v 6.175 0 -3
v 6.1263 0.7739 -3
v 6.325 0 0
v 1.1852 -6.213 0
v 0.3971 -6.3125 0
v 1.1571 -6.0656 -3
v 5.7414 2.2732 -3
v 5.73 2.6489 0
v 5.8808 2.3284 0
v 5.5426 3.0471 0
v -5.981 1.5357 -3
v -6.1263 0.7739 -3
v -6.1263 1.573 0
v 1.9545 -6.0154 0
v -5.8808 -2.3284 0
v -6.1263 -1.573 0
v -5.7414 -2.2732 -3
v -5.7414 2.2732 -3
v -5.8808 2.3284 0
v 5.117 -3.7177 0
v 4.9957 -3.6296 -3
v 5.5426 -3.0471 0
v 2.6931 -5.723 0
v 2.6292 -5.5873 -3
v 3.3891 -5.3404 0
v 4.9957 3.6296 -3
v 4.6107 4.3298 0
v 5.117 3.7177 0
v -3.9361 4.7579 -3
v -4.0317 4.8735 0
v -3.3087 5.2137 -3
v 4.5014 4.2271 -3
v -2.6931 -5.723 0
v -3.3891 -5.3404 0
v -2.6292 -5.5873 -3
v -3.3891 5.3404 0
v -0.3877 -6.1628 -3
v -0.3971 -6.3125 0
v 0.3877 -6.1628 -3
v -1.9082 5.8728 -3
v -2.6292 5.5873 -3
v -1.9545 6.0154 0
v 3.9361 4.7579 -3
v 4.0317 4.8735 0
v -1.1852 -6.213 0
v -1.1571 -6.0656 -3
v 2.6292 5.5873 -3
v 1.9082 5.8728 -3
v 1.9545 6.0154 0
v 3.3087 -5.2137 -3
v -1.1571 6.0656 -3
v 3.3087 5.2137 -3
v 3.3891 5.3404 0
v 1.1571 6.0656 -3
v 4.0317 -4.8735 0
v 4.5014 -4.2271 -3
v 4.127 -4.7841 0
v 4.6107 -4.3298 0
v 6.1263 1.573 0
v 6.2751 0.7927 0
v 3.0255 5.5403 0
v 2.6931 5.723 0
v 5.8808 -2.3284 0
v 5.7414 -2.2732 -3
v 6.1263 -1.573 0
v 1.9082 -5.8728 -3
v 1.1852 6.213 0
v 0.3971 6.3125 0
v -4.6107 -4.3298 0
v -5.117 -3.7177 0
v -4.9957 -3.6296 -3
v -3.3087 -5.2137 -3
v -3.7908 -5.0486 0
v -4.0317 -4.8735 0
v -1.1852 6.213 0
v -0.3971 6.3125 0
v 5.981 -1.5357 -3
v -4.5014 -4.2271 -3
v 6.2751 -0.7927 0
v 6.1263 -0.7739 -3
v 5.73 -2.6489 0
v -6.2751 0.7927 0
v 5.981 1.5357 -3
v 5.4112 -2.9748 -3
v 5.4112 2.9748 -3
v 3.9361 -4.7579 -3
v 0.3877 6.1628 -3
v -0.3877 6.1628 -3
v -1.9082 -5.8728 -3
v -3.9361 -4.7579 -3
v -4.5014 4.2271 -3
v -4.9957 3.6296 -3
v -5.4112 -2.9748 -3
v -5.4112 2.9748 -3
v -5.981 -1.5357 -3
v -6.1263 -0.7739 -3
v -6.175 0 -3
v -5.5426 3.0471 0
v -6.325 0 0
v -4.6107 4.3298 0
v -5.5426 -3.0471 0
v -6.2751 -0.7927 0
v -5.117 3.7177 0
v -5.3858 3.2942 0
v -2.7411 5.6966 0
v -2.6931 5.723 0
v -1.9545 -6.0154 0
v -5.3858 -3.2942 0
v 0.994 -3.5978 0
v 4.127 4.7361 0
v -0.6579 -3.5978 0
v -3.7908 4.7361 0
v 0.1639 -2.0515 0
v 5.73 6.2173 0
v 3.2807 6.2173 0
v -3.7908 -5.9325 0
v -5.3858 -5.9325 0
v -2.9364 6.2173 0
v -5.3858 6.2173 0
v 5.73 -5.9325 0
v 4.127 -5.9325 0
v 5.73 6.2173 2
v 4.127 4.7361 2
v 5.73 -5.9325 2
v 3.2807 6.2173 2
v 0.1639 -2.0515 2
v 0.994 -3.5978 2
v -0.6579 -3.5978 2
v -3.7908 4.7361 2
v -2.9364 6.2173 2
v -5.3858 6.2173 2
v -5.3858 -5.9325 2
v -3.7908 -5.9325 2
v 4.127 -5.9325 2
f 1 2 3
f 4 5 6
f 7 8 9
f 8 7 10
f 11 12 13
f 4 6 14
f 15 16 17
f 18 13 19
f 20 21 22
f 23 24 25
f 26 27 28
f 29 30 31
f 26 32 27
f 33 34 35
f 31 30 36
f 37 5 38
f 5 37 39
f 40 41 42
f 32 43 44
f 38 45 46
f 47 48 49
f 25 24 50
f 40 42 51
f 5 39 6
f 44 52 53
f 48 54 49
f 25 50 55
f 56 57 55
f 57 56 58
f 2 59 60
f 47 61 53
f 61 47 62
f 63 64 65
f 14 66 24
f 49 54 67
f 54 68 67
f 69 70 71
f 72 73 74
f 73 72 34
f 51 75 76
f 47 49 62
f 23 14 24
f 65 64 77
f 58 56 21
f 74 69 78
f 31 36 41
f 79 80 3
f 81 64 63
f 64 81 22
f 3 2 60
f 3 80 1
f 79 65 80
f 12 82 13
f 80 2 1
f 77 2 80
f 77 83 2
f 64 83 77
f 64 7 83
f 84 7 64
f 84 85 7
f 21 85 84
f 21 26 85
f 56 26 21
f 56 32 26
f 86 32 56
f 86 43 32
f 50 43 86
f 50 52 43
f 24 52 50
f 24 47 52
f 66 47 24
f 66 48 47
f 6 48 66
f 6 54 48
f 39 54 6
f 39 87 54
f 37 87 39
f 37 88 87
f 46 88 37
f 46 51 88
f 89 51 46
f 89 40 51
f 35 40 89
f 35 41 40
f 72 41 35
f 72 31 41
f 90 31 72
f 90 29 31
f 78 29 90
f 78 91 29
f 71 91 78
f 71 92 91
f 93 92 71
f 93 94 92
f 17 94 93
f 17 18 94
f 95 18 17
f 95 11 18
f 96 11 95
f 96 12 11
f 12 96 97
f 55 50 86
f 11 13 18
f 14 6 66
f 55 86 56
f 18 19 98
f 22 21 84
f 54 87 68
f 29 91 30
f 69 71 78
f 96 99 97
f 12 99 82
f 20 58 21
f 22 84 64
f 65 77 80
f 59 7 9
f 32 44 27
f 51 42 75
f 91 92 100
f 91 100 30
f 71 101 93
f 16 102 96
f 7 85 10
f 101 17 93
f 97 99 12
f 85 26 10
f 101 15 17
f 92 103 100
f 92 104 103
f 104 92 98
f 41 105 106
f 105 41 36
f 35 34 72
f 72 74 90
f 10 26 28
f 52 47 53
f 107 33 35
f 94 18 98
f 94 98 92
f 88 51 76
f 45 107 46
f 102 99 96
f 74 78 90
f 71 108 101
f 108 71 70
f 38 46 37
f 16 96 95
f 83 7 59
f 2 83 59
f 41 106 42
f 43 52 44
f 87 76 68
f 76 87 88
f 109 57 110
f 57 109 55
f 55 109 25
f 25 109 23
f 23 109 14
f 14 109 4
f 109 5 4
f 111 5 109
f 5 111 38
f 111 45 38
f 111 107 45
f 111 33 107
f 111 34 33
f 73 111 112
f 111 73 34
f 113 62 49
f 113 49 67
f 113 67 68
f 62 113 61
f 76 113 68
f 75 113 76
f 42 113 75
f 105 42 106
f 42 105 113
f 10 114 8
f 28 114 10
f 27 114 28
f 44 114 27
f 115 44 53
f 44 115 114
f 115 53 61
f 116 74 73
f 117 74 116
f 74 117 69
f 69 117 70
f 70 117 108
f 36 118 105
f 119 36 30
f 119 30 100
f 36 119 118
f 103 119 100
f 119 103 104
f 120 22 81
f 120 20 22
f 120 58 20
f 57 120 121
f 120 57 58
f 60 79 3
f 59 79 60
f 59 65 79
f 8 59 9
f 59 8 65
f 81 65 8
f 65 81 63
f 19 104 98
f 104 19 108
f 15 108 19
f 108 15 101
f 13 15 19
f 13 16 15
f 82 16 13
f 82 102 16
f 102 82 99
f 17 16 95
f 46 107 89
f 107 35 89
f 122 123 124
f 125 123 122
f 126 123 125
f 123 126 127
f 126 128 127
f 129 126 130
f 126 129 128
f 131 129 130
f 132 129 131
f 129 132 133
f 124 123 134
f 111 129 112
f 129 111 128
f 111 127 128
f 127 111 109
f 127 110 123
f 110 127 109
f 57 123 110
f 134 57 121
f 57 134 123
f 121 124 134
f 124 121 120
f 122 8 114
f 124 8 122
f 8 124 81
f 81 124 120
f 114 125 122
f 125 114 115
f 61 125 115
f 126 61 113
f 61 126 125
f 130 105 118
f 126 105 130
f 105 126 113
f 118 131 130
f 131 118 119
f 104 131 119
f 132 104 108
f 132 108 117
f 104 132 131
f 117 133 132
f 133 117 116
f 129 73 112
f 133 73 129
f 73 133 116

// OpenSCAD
$fn = 50;

difference() {
	union() {
		translate(v = [0, 0, -3.0]) {
			cylinder(h = 3, r1 = 6.175, r2 = 6.325);
		}
		linear_extrude(height = 2) {
			text(font = "Impact", halign = "center", size = 12, text = "M", valign = "center");
		}
	}
	union();
}
